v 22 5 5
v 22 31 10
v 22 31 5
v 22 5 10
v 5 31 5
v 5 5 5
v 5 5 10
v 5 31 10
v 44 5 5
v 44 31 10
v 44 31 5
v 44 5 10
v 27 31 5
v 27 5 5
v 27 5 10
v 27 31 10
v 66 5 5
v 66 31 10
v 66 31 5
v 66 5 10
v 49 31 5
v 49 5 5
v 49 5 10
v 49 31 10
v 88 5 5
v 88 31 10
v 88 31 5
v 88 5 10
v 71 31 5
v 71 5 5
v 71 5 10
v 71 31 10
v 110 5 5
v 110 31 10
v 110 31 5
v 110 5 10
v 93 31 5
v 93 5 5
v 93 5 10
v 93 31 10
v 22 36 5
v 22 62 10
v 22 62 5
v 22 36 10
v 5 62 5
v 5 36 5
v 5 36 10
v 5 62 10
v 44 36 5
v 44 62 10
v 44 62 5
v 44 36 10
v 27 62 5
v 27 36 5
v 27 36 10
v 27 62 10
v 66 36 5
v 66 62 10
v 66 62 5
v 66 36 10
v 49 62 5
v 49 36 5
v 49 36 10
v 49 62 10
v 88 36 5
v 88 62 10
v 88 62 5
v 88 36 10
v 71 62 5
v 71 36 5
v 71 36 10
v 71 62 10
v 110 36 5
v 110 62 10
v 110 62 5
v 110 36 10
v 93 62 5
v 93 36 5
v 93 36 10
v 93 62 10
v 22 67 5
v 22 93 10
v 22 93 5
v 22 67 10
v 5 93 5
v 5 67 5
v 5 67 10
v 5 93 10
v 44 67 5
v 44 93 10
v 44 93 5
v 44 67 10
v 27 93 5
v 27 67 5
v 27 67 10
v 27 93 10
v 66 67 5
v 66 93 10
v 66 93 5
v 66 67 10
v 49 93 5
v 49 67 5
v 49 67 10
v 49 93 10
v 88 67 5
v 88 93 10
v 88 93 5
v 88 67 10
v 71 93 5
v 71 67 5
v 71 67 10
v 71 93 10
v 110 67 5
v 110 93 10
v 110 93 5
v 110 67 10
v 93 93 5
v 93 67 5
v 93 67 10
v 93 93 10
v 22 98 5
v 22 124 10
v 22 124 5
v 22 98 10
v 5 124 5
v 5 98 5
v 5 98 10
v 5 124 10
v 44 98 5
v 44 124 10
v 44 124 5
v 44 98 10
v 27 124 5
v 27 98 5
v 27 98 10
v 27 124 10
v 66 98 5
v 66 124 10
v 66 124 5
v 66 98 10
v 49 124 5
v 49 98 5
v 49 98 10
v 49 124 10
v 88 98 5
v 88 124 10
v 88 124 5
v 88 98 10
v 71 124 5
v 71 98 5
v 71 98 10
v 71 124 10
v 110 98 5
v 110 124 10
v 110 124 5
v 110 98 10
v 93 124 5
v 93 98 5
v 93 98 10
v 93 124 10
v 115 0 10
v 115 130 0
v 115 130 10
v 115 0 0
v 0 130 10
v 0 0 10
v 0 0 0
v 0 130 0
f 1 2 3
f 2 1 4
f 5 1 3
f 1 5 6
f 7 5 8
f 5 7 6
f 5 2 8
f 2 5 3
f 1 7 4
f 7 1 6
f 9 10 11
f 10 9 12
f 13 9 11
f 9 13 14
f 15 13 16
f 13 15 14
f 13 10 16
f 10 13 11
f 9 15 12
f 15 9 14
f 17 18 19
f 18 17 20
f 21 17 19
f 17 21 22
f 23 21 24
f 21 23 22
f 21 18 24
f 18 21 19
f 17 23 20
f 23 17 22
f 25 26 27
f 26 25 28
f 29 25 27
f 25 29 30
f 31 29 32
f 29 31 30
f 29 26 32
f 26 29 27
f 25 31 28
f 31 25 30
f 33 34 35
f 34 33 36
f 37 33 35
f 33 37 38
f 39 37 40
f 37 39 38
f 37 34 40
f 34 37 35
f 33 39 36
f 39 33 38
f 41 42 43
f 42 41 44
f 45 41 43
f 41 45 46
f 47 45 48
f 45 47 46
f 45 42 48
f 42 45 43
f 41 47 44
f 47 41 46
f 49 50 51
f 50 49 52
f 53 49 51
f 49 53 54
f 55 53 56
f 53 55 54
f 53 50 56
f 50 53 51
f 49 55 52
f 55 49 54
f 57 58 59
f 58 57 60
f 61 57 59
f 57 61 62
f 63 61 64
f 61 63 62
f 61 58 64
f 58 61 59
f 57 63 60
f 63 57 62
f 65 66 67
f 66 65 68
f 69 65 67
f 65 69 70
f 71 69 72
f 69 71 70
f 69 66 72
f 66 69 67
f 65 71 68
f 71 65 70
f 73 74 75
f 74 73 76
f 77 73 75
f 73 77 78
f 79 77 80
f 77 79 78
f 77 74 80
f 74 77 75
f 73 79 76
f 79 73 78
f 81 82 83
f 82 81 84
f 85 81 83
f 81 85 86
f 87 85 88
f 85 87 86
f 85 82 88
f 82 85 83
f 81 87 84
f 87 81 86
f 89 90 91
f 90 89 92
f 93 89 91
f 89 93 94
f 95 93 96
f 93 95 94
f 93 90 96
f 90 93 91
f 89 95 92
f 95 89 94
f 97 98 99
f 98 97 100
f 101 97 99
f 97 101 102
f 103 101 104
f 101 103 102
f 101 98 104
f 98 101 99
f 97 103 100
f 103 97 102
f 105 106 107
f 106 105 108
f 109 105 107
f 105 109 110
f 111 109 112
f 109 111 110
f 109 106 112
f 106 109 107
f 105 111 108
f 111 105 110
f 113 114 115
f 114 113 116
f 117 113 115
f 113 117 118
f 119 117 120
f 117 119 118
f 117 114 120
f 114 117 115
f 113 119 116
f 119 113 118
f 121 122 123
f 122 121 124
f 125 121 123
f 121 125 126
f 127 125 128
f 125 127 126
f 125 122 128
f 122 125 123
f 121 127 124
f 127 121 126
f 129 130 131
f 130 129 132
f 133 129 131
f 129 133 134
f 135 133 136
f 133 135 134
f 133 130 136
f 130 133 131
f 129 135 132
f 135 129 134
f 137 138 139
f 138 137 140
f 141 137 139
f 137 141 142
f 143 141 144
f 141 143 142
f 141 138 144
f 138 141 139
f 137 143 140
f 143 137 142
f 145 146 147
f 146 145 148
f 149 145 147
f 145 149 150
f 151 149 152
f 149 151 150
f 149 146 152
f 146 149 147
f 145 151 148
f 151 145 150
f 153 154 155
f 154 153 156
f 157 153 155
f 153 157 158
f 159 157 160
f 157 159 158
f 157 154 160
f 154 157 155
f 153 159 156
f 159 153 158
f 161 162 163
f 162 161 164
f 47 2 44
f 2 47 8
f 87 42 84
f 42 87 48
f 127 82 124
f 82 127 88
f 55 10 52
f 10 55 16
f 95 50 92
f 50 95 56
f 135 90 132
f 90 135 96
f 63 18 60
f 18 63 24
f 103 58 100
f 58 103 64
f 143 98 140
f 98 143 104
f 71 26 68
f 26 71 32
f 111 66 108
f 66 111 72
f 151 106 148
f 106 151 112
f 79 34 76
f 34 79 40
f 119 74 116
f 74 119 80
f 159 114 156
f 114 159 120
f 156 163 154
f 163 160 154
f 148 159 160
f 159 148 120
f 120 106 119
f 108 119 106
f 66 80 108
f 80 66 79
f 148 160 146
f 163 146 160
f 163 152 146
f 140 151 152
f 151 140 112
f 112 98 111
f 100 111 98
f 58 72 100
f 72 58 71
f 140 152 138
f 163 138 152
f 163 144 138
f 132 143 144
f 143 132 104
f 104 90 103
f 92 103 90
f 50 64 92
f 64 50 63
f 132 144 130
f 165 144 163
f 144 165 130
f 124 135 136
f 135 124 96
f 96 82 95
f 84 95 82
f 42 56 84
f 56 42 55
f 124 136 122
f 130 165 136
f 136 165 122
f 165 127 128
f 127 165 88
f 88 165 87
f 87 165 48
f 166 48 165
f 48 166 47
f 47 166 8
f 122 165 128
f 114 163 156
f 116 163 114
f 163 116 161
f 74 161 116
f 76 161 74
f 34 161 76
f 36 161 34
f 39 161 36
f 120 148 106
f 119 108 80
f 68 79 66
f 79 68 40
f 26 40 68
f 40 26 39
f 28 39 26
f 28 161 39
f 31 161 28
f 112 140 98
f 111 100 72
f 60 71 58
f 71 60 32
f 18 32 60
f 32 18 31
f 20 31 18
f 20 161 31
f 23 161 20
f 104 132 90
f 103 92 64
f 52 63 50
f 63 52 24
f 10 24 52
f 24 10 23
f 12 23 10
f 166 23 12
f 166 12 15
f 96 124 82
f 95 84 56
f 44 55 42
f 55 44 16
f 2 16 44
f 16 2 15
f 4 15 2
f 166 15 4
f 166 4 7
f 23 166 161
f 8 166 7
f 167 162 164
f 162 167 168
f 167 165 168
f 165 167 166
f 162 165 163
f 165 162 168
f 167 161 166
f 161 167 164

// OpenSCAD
$fn = 96;

BoxZ=10;
BoxY=130;
BoxX=115;
BatteryD=26;
BatteryW=17;
BatteryH=45;
Space=5;
BoxWall=5;
BoxFloor=5;
CS=(BatteryD/2)+BoxWall;
MaxX=BoxX-BatteryW-BoxWall;
MaxY=BoxY-BatteryD-BoxWall;

difference()
{
  cube([BoxX,BoxY,BoxZ]);
  for (y=[BoxWall:BatteryD+Space:MaxY])
  {
    for (x=[BoxWall:BatteryW+Space:MaxX])
    {
      translate([x,y,BoxFloor]) cube([BatteryW,BatteryD,BatteryH]);
      
    }
  }
}
